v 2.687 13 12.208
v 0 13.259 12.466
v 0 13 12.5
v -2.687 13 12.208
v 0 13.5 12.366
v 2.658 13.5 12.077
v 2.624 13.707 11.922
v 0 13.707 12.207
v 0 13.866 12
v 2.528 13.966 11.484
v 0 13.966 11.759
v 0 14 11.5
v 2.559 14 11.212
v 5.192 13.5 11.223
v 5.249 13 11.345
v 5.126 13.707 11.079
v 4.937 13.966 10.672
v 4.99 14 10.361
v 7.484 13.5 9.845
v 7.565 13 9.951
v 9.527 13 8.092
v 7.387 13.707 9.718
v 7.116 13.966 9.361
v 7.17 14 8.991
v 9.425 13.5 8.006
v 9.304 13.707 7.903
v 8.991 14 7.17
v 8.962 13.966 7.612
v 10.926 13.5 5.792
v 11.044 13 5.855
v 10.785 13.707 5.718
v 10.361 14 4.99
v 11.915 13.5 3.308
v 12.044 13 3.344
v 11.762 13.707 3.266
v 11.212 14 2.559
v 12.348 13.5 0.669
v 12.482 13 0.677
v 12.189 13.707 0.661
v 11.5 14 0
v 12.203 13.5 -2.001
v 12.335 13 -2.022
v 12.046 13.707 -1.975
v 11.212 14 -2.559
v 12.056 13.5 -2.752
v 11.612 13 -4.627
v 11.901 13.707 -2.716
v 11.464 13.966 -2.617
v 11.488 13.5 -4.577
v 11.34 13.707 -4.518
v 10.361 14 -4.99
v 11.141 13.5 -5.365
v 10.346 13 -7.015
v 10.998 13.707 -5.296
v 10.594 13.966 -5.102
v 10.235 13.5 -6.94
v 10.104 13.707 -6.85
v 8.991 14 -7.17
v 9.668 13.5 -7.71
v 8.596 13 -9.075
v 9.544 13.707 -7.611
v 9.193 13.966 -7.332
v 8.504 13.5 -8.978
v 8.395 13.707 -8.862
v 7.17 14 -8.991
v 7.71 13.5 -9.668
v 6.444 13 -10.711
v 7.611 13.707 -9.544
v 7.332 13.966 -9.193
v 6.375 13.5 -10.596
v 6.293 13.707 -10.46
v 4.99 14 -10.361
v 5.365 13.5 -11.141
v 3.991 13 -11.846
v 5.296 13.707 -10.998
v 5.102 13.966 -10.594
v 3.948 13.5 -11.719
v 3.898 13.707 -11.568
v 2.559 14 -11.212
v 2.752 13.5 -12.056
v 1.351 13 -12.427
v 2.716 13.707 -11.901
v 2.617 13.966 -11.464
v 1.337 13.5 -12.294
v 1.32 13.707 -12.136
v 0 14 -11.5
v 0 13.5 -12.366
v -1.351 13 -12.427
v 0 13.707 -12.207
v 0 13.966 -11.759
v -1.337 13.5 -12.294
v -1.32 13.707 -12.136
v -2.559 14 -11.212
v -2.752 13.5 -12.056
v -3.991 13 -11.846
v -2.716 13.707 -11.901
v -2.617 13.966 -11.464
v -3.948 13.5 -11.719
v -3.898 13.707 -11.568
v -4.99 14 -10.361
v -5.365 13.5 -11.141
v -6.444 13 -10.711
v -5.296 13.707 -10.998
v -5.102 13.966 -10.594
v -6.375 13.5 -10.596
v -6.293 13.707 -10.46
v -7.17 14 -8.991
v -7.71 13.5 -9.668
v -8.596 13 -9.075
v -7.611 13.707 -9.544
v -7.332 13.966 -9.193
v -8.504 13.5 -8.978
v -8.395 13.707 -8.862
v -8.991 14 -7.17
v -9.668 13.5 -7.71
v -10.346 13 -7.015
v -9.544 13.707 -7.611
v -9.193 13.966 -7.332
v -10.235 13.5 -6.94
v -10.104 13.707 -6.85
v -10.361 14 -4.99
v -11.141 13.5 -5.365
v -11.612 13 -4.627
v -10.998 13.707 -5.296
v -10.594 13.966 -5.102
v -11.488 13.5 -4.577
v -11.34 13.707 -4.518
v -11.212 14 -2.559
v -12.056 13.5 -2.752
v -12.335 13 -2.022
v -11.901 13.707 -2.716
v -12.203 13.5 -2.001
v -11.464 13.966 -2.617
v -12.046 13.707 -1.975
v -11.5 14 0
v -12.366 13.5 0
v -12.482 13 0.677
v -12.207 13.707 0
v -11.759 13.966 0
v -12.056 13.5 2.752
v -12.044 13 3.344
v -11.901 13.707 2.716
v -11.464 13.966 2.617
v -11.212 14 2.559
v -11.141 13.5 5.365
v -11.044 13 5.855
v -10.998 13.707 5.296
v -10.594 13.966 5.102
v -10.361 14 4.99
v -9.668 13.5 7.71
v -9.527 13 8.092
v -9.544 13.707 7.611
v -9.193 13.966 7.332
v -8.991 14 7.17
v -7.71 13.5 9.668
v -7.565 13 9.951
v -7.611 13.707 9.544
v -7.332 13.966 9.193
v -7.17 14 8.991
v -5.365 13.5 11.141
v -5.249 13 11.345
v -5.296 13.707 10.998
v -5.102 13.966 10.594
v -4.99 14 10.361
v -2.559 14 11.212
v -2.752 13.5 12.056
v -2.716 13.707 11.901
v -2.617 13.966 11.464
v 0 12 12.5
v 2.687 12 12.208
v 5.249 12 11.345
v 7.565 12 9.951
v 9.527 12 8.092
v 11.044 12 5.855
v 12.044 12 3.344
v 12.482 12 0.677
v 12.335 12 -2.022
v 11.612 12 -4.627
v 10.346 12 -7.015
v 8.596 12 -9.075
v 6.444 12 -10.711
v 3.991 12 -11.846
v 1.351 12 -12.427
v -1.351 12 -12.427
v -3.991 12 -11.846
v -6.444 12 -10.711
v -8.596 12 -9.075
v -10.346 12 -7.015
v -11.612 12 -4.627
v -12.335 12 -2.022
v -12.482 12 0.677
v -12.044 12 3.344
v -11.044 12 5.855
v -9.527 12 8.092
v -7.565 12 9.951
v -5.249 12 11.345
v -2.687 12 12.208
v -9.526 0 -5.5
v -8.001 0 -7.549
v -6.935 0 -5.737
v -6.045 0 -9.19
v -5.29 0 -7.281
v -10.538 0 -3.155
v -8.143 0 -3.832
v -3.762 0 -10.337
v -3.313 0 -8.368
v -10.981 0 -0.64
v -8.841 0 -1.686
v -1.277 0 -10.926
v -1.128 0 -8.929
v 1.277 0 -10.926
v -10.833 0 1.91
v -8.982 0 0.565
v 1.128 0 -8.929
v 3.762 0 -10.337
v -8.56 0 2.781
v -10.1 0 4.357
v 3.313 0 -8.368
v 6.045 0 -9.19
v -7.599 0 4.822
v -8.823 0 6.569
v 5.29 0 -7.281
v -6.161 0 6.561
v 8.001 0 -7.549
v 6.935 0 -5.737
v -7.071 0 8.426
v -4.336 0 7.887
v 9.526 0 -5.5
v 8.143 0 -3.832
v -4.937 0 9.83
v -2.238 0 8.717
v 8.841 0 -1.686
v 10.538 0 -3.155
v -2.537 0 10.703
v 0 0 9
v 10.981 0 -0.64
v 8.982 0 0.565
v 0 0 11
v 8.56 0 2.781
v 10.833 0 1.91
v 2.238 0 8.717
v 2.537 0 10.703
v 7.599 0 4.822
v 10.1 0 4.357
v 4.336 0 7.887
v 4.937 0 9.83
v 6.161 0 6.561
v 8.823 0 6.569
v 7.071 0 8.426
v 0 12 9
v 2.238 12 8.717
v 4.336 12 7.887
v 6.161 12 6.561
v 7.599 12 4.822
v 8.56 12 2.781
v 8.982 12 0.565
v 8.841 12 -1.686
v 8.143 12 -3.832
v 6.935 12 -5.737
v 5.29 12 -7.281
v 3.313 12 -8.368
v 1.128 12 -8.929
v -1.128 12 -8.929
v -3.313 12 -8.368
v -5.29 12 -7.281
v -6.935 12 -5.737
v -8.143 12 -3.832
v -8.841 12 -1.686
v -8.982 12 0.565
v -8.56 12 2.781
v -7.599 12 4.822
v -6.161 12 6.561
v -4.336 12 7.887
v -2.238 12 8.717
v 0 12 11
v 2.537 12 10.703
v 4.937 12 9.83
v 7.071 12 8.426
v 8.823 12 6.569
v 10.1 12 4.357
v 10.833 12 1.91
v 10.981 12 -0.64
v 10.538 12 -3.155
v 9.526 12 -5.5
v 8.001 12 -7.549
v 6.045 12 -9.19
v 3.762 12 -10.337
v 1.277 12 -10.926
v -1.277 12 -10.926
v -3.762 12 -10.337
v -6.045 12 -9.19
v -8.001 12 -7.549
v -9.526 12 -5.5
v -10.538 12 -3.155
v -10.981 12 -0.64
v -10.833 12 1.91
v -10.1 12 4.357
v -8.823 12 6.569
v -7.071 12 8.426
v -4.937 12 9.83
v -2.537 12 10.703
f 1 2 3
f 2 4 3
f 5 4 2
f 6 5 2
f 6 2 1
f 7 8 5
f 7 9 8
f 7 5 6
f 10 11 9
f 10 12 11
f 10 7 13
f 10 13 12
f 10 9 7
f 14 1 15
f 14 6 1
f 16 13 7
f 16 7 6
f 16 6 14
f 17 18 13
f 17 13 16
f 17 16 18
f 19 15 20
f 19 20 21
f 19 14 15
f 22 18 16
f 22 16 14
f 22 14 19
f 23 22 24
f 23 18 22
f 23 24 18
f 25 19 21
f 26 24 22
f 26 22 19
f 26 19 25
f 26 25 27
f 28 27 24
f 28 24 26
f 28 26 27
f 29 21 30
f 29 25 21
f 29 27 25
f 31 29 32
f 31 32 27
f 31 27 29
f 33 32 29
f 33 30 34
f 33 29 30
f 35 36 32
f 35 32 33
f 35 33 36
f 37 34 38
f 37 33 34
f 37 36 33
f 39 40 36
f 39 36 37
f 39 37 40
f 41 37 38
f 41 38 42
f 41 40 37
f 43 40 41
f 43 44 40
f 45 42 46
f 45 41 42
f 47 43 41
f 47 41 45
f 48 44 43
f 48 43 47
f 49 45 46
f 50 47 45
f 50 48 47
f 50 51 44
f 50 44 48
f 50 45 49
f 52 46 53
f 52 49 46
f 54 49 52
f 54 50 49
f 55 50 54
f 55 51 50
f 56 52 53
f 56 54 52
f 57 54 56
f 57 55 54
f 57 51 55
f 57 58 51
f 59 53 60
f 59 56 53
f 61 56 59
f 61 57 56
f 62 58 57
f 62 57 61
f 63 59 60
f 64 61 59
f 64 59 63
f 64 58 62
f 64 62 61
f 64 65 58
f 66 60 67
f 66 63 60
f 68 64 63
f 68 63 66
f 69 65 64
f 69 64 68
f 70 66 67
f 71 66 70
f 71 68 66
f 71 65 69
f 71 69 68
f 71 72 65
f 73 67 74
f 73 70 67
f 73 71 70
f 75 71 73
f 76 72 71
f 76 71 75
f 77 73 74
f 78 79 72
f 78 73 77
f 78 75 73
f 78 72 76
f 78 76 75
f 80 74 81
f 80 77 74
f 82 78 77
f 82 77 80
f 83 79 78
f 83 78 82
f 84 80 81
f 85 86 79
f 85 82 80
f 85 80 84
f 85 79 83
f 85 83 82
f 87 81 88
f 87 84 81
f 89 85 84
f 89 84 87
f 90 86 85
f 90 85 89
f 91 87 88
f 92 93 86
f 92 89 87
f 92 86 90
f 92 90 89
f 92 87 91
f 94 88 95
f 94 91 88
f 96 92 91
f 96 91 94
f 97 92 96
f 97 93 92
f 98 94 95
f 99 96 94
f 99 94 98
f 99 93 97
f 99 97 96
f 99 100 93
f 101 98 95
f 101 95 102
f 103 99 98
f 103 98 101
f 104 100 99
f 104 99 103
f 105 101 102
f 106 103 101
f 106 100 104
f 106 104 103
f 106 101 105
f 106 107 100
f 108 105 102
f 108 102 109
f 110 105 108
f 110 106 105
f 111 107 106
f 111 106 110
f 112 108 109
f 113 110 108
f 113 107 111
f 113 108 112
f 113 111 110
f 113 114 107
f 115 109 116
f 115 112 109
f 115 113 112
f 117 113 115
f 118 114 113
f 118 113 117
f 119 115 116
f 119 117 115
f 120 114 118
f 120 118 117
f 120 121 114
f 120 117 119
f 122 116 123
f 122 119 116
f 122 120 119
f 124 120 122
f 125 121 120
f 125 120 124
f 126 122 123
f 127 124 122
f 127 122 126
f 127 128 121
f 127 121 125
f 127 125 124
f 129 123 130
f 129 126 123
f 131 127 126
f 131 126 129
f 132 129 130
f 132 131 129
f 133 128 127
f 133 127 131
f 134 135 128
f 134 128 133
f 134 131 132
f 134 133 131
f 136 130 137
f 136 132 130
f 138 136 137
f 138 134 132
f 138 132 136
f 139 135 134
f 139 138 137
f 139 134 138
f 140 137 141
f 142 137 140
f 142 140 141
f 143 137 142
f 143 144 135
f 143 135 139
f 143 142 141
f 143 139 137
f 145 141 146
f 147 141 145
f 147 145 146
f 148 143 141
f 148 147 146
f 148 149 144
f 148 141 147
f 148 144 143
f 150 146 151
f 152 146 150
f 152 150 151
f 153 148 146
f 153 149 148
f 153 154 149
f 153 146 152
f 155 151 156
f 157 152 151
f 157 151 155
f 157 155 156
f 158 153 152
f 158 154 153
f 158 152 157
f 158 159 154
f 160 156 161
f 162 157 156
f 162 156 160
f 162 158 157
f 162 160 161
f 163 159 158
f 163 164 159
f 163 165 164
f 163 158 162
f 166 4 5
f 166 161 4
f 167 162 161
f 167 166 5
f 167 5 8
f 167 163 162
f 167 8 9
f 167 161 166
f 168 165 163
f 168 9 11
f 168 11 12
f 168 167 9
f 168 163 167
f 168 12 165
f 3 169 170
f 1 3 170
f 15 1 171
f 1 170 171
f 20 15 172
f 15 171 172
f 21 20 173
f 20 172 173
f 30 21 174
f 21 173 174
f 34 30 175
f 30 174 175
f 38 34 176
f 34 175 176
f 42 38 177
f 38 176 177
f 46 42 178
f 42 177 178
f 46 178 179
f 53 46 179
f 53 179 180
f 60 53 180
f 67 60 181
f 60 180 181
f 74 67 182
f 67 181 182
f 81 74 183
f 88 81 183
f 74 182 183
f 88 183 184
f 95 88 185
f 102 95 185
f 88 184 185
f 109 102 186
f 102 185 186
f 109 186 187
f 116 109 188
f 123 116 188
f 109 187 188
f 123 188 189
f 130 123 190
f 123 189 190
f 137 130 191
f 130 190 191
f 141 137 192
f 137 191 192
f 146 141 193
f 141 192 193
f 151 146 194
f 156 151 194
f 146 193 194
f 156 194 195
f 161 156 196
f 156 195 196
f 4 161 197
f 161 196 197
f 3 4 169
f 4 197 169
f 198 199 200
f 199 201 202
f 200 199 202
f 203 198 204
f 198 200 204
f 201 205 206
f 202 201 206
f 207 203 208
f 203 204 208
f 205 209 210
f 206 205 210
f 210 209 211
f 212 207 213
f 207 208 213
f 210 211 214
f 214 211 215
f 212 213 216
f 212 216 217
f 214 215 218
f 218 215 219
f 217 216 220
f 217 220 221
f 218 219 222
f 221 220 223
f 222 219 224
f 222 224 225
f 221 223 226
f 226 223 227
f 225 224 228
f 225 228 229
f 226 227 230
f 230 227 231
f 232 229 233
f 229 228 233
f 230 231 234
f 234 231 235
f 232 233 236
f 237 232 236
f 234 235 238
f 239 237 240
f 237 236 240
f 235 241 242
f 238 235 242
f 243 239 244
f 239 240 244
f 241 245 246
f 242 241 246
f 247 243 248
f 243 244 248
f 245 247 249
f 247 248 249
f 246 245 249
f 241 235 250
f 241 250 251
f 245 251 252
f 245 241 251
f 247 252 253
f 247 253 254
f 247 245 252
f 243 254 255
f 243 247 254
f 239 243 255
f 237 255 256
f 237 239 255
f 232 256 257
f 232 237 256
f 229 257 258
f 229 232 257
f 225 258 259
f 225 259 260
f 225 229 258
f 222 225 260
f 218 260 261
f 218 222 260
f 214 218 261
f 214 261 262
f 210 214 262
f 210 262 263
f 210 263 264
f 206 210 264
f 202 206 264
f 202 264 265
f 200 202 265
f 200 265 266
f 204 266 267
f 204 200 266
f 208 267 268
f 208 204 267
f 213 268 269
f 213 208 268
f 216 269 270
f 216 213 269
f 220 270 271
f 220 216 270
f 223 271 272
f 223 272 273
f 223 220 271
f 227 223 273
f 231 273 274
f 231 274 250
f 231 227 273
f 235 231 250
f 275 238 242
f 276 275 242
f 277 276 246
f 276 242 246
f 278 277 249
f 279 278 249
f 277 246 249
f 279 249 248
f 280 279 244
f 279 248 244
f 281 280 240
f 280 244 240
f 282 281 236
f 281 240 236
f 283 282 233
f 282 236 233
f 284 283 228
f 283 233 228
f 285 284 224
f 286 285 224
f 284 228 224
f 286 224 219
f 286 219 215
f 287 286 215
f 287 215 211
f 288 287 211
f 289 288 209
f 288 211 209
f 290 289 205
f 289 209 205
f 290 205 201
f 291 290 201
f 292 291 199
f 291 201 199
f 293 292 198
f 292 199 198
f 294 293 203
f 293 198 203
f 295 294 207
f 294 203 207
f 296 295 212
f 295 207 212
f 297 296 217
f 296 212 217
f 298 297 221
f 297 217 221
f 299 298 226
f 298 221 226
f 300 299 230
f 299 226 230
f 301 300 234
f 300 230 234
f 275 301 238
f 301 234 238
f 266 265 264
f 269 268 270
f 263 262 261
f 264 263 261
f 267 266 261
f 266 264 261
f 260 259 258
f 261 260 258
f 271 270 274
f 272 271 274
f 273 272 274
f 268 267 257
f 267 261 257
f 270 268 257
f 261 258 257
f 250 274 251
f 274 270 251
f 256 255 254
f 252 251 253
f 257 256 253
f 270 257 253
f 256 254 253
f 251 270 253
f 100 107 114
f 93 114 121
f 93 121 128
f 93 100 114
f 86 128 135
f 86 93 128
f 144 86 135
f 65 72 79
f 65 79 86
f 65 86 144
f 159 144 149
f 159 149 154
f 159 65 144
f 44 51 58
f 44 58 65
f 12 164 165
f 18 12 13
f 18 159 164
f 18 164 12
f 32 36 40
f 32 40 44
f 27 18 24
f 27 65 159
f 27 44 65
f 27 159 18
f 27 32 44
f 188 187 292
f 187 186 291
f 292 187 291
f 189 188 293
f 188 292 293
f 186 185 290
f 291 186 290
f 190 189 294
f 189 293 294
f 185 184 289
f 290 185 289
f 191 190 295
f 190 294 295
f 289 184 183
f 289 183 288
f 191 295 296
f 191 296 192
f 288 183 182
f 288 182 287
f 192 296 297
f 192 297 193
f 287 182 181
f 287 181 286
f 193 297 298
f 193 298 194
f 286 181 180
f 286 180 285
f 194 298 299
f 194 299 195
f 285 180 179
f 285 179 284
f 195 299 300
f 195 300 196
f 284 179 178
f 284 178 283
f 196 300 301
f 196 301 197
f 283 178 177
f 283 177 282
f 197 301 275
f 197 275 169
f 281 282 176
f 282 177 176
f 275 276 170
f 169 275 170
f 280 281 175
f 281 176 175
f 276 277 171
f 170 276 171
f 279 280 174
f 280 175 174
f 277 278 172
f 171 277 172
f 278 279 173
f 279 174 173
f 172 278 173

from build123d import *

# Parameters (mm, degrees)
SKETCH2_R           = 11
SKETCH2_R_2         = 9
BOSS_EXTRUDE1_DEPTH = 12
SKETCH3_R           = 12.5
BOSS_EXTRUDE2_DEPTH = 2
FILLET1_R           = 1


with BuildPart() as part:
    # Sketch2 → Boss-Extrude1 (new body)
    with BuildSketch(Plane(origin=(0, 0, 0), x_dir=(1, 0, 0), z_dir=(0, 1, 0))):
        with Locations(Location((0, 0, 0), (0, 0, 270))):
            Circle(SKETCH2_R)
        with Locations(Location((0, 0, 0), (0, 0, 270))):
            Circle(SKETCH2_R_2, mode=Mode.SUBTRACT)
    extrude(amount=BOSS_EXTRUDE1_DEPTH)

    # Sketch3 → Boss-Extrude2 (add)
    with BuildSketch(Plane(origin=(0, 12, 0), x_dir=(1, 0, 0), z_dir=(0, 1, 0))):
        with Locations(Location((0, 0, 0), (0, 0, 270))):
            Circle(SKETCH3_R)
    extrude(amount=BOSS_EXTRUDE2_DEPTH)

    # Fillet1
    fillet1_edges = [part.edges().sort_by_distance(p)[0] for p in [
        (0, 14, -12.5),
    ]]
    fillet(fillet1_edges, radius=FILLET1_R)


solid = part.part
